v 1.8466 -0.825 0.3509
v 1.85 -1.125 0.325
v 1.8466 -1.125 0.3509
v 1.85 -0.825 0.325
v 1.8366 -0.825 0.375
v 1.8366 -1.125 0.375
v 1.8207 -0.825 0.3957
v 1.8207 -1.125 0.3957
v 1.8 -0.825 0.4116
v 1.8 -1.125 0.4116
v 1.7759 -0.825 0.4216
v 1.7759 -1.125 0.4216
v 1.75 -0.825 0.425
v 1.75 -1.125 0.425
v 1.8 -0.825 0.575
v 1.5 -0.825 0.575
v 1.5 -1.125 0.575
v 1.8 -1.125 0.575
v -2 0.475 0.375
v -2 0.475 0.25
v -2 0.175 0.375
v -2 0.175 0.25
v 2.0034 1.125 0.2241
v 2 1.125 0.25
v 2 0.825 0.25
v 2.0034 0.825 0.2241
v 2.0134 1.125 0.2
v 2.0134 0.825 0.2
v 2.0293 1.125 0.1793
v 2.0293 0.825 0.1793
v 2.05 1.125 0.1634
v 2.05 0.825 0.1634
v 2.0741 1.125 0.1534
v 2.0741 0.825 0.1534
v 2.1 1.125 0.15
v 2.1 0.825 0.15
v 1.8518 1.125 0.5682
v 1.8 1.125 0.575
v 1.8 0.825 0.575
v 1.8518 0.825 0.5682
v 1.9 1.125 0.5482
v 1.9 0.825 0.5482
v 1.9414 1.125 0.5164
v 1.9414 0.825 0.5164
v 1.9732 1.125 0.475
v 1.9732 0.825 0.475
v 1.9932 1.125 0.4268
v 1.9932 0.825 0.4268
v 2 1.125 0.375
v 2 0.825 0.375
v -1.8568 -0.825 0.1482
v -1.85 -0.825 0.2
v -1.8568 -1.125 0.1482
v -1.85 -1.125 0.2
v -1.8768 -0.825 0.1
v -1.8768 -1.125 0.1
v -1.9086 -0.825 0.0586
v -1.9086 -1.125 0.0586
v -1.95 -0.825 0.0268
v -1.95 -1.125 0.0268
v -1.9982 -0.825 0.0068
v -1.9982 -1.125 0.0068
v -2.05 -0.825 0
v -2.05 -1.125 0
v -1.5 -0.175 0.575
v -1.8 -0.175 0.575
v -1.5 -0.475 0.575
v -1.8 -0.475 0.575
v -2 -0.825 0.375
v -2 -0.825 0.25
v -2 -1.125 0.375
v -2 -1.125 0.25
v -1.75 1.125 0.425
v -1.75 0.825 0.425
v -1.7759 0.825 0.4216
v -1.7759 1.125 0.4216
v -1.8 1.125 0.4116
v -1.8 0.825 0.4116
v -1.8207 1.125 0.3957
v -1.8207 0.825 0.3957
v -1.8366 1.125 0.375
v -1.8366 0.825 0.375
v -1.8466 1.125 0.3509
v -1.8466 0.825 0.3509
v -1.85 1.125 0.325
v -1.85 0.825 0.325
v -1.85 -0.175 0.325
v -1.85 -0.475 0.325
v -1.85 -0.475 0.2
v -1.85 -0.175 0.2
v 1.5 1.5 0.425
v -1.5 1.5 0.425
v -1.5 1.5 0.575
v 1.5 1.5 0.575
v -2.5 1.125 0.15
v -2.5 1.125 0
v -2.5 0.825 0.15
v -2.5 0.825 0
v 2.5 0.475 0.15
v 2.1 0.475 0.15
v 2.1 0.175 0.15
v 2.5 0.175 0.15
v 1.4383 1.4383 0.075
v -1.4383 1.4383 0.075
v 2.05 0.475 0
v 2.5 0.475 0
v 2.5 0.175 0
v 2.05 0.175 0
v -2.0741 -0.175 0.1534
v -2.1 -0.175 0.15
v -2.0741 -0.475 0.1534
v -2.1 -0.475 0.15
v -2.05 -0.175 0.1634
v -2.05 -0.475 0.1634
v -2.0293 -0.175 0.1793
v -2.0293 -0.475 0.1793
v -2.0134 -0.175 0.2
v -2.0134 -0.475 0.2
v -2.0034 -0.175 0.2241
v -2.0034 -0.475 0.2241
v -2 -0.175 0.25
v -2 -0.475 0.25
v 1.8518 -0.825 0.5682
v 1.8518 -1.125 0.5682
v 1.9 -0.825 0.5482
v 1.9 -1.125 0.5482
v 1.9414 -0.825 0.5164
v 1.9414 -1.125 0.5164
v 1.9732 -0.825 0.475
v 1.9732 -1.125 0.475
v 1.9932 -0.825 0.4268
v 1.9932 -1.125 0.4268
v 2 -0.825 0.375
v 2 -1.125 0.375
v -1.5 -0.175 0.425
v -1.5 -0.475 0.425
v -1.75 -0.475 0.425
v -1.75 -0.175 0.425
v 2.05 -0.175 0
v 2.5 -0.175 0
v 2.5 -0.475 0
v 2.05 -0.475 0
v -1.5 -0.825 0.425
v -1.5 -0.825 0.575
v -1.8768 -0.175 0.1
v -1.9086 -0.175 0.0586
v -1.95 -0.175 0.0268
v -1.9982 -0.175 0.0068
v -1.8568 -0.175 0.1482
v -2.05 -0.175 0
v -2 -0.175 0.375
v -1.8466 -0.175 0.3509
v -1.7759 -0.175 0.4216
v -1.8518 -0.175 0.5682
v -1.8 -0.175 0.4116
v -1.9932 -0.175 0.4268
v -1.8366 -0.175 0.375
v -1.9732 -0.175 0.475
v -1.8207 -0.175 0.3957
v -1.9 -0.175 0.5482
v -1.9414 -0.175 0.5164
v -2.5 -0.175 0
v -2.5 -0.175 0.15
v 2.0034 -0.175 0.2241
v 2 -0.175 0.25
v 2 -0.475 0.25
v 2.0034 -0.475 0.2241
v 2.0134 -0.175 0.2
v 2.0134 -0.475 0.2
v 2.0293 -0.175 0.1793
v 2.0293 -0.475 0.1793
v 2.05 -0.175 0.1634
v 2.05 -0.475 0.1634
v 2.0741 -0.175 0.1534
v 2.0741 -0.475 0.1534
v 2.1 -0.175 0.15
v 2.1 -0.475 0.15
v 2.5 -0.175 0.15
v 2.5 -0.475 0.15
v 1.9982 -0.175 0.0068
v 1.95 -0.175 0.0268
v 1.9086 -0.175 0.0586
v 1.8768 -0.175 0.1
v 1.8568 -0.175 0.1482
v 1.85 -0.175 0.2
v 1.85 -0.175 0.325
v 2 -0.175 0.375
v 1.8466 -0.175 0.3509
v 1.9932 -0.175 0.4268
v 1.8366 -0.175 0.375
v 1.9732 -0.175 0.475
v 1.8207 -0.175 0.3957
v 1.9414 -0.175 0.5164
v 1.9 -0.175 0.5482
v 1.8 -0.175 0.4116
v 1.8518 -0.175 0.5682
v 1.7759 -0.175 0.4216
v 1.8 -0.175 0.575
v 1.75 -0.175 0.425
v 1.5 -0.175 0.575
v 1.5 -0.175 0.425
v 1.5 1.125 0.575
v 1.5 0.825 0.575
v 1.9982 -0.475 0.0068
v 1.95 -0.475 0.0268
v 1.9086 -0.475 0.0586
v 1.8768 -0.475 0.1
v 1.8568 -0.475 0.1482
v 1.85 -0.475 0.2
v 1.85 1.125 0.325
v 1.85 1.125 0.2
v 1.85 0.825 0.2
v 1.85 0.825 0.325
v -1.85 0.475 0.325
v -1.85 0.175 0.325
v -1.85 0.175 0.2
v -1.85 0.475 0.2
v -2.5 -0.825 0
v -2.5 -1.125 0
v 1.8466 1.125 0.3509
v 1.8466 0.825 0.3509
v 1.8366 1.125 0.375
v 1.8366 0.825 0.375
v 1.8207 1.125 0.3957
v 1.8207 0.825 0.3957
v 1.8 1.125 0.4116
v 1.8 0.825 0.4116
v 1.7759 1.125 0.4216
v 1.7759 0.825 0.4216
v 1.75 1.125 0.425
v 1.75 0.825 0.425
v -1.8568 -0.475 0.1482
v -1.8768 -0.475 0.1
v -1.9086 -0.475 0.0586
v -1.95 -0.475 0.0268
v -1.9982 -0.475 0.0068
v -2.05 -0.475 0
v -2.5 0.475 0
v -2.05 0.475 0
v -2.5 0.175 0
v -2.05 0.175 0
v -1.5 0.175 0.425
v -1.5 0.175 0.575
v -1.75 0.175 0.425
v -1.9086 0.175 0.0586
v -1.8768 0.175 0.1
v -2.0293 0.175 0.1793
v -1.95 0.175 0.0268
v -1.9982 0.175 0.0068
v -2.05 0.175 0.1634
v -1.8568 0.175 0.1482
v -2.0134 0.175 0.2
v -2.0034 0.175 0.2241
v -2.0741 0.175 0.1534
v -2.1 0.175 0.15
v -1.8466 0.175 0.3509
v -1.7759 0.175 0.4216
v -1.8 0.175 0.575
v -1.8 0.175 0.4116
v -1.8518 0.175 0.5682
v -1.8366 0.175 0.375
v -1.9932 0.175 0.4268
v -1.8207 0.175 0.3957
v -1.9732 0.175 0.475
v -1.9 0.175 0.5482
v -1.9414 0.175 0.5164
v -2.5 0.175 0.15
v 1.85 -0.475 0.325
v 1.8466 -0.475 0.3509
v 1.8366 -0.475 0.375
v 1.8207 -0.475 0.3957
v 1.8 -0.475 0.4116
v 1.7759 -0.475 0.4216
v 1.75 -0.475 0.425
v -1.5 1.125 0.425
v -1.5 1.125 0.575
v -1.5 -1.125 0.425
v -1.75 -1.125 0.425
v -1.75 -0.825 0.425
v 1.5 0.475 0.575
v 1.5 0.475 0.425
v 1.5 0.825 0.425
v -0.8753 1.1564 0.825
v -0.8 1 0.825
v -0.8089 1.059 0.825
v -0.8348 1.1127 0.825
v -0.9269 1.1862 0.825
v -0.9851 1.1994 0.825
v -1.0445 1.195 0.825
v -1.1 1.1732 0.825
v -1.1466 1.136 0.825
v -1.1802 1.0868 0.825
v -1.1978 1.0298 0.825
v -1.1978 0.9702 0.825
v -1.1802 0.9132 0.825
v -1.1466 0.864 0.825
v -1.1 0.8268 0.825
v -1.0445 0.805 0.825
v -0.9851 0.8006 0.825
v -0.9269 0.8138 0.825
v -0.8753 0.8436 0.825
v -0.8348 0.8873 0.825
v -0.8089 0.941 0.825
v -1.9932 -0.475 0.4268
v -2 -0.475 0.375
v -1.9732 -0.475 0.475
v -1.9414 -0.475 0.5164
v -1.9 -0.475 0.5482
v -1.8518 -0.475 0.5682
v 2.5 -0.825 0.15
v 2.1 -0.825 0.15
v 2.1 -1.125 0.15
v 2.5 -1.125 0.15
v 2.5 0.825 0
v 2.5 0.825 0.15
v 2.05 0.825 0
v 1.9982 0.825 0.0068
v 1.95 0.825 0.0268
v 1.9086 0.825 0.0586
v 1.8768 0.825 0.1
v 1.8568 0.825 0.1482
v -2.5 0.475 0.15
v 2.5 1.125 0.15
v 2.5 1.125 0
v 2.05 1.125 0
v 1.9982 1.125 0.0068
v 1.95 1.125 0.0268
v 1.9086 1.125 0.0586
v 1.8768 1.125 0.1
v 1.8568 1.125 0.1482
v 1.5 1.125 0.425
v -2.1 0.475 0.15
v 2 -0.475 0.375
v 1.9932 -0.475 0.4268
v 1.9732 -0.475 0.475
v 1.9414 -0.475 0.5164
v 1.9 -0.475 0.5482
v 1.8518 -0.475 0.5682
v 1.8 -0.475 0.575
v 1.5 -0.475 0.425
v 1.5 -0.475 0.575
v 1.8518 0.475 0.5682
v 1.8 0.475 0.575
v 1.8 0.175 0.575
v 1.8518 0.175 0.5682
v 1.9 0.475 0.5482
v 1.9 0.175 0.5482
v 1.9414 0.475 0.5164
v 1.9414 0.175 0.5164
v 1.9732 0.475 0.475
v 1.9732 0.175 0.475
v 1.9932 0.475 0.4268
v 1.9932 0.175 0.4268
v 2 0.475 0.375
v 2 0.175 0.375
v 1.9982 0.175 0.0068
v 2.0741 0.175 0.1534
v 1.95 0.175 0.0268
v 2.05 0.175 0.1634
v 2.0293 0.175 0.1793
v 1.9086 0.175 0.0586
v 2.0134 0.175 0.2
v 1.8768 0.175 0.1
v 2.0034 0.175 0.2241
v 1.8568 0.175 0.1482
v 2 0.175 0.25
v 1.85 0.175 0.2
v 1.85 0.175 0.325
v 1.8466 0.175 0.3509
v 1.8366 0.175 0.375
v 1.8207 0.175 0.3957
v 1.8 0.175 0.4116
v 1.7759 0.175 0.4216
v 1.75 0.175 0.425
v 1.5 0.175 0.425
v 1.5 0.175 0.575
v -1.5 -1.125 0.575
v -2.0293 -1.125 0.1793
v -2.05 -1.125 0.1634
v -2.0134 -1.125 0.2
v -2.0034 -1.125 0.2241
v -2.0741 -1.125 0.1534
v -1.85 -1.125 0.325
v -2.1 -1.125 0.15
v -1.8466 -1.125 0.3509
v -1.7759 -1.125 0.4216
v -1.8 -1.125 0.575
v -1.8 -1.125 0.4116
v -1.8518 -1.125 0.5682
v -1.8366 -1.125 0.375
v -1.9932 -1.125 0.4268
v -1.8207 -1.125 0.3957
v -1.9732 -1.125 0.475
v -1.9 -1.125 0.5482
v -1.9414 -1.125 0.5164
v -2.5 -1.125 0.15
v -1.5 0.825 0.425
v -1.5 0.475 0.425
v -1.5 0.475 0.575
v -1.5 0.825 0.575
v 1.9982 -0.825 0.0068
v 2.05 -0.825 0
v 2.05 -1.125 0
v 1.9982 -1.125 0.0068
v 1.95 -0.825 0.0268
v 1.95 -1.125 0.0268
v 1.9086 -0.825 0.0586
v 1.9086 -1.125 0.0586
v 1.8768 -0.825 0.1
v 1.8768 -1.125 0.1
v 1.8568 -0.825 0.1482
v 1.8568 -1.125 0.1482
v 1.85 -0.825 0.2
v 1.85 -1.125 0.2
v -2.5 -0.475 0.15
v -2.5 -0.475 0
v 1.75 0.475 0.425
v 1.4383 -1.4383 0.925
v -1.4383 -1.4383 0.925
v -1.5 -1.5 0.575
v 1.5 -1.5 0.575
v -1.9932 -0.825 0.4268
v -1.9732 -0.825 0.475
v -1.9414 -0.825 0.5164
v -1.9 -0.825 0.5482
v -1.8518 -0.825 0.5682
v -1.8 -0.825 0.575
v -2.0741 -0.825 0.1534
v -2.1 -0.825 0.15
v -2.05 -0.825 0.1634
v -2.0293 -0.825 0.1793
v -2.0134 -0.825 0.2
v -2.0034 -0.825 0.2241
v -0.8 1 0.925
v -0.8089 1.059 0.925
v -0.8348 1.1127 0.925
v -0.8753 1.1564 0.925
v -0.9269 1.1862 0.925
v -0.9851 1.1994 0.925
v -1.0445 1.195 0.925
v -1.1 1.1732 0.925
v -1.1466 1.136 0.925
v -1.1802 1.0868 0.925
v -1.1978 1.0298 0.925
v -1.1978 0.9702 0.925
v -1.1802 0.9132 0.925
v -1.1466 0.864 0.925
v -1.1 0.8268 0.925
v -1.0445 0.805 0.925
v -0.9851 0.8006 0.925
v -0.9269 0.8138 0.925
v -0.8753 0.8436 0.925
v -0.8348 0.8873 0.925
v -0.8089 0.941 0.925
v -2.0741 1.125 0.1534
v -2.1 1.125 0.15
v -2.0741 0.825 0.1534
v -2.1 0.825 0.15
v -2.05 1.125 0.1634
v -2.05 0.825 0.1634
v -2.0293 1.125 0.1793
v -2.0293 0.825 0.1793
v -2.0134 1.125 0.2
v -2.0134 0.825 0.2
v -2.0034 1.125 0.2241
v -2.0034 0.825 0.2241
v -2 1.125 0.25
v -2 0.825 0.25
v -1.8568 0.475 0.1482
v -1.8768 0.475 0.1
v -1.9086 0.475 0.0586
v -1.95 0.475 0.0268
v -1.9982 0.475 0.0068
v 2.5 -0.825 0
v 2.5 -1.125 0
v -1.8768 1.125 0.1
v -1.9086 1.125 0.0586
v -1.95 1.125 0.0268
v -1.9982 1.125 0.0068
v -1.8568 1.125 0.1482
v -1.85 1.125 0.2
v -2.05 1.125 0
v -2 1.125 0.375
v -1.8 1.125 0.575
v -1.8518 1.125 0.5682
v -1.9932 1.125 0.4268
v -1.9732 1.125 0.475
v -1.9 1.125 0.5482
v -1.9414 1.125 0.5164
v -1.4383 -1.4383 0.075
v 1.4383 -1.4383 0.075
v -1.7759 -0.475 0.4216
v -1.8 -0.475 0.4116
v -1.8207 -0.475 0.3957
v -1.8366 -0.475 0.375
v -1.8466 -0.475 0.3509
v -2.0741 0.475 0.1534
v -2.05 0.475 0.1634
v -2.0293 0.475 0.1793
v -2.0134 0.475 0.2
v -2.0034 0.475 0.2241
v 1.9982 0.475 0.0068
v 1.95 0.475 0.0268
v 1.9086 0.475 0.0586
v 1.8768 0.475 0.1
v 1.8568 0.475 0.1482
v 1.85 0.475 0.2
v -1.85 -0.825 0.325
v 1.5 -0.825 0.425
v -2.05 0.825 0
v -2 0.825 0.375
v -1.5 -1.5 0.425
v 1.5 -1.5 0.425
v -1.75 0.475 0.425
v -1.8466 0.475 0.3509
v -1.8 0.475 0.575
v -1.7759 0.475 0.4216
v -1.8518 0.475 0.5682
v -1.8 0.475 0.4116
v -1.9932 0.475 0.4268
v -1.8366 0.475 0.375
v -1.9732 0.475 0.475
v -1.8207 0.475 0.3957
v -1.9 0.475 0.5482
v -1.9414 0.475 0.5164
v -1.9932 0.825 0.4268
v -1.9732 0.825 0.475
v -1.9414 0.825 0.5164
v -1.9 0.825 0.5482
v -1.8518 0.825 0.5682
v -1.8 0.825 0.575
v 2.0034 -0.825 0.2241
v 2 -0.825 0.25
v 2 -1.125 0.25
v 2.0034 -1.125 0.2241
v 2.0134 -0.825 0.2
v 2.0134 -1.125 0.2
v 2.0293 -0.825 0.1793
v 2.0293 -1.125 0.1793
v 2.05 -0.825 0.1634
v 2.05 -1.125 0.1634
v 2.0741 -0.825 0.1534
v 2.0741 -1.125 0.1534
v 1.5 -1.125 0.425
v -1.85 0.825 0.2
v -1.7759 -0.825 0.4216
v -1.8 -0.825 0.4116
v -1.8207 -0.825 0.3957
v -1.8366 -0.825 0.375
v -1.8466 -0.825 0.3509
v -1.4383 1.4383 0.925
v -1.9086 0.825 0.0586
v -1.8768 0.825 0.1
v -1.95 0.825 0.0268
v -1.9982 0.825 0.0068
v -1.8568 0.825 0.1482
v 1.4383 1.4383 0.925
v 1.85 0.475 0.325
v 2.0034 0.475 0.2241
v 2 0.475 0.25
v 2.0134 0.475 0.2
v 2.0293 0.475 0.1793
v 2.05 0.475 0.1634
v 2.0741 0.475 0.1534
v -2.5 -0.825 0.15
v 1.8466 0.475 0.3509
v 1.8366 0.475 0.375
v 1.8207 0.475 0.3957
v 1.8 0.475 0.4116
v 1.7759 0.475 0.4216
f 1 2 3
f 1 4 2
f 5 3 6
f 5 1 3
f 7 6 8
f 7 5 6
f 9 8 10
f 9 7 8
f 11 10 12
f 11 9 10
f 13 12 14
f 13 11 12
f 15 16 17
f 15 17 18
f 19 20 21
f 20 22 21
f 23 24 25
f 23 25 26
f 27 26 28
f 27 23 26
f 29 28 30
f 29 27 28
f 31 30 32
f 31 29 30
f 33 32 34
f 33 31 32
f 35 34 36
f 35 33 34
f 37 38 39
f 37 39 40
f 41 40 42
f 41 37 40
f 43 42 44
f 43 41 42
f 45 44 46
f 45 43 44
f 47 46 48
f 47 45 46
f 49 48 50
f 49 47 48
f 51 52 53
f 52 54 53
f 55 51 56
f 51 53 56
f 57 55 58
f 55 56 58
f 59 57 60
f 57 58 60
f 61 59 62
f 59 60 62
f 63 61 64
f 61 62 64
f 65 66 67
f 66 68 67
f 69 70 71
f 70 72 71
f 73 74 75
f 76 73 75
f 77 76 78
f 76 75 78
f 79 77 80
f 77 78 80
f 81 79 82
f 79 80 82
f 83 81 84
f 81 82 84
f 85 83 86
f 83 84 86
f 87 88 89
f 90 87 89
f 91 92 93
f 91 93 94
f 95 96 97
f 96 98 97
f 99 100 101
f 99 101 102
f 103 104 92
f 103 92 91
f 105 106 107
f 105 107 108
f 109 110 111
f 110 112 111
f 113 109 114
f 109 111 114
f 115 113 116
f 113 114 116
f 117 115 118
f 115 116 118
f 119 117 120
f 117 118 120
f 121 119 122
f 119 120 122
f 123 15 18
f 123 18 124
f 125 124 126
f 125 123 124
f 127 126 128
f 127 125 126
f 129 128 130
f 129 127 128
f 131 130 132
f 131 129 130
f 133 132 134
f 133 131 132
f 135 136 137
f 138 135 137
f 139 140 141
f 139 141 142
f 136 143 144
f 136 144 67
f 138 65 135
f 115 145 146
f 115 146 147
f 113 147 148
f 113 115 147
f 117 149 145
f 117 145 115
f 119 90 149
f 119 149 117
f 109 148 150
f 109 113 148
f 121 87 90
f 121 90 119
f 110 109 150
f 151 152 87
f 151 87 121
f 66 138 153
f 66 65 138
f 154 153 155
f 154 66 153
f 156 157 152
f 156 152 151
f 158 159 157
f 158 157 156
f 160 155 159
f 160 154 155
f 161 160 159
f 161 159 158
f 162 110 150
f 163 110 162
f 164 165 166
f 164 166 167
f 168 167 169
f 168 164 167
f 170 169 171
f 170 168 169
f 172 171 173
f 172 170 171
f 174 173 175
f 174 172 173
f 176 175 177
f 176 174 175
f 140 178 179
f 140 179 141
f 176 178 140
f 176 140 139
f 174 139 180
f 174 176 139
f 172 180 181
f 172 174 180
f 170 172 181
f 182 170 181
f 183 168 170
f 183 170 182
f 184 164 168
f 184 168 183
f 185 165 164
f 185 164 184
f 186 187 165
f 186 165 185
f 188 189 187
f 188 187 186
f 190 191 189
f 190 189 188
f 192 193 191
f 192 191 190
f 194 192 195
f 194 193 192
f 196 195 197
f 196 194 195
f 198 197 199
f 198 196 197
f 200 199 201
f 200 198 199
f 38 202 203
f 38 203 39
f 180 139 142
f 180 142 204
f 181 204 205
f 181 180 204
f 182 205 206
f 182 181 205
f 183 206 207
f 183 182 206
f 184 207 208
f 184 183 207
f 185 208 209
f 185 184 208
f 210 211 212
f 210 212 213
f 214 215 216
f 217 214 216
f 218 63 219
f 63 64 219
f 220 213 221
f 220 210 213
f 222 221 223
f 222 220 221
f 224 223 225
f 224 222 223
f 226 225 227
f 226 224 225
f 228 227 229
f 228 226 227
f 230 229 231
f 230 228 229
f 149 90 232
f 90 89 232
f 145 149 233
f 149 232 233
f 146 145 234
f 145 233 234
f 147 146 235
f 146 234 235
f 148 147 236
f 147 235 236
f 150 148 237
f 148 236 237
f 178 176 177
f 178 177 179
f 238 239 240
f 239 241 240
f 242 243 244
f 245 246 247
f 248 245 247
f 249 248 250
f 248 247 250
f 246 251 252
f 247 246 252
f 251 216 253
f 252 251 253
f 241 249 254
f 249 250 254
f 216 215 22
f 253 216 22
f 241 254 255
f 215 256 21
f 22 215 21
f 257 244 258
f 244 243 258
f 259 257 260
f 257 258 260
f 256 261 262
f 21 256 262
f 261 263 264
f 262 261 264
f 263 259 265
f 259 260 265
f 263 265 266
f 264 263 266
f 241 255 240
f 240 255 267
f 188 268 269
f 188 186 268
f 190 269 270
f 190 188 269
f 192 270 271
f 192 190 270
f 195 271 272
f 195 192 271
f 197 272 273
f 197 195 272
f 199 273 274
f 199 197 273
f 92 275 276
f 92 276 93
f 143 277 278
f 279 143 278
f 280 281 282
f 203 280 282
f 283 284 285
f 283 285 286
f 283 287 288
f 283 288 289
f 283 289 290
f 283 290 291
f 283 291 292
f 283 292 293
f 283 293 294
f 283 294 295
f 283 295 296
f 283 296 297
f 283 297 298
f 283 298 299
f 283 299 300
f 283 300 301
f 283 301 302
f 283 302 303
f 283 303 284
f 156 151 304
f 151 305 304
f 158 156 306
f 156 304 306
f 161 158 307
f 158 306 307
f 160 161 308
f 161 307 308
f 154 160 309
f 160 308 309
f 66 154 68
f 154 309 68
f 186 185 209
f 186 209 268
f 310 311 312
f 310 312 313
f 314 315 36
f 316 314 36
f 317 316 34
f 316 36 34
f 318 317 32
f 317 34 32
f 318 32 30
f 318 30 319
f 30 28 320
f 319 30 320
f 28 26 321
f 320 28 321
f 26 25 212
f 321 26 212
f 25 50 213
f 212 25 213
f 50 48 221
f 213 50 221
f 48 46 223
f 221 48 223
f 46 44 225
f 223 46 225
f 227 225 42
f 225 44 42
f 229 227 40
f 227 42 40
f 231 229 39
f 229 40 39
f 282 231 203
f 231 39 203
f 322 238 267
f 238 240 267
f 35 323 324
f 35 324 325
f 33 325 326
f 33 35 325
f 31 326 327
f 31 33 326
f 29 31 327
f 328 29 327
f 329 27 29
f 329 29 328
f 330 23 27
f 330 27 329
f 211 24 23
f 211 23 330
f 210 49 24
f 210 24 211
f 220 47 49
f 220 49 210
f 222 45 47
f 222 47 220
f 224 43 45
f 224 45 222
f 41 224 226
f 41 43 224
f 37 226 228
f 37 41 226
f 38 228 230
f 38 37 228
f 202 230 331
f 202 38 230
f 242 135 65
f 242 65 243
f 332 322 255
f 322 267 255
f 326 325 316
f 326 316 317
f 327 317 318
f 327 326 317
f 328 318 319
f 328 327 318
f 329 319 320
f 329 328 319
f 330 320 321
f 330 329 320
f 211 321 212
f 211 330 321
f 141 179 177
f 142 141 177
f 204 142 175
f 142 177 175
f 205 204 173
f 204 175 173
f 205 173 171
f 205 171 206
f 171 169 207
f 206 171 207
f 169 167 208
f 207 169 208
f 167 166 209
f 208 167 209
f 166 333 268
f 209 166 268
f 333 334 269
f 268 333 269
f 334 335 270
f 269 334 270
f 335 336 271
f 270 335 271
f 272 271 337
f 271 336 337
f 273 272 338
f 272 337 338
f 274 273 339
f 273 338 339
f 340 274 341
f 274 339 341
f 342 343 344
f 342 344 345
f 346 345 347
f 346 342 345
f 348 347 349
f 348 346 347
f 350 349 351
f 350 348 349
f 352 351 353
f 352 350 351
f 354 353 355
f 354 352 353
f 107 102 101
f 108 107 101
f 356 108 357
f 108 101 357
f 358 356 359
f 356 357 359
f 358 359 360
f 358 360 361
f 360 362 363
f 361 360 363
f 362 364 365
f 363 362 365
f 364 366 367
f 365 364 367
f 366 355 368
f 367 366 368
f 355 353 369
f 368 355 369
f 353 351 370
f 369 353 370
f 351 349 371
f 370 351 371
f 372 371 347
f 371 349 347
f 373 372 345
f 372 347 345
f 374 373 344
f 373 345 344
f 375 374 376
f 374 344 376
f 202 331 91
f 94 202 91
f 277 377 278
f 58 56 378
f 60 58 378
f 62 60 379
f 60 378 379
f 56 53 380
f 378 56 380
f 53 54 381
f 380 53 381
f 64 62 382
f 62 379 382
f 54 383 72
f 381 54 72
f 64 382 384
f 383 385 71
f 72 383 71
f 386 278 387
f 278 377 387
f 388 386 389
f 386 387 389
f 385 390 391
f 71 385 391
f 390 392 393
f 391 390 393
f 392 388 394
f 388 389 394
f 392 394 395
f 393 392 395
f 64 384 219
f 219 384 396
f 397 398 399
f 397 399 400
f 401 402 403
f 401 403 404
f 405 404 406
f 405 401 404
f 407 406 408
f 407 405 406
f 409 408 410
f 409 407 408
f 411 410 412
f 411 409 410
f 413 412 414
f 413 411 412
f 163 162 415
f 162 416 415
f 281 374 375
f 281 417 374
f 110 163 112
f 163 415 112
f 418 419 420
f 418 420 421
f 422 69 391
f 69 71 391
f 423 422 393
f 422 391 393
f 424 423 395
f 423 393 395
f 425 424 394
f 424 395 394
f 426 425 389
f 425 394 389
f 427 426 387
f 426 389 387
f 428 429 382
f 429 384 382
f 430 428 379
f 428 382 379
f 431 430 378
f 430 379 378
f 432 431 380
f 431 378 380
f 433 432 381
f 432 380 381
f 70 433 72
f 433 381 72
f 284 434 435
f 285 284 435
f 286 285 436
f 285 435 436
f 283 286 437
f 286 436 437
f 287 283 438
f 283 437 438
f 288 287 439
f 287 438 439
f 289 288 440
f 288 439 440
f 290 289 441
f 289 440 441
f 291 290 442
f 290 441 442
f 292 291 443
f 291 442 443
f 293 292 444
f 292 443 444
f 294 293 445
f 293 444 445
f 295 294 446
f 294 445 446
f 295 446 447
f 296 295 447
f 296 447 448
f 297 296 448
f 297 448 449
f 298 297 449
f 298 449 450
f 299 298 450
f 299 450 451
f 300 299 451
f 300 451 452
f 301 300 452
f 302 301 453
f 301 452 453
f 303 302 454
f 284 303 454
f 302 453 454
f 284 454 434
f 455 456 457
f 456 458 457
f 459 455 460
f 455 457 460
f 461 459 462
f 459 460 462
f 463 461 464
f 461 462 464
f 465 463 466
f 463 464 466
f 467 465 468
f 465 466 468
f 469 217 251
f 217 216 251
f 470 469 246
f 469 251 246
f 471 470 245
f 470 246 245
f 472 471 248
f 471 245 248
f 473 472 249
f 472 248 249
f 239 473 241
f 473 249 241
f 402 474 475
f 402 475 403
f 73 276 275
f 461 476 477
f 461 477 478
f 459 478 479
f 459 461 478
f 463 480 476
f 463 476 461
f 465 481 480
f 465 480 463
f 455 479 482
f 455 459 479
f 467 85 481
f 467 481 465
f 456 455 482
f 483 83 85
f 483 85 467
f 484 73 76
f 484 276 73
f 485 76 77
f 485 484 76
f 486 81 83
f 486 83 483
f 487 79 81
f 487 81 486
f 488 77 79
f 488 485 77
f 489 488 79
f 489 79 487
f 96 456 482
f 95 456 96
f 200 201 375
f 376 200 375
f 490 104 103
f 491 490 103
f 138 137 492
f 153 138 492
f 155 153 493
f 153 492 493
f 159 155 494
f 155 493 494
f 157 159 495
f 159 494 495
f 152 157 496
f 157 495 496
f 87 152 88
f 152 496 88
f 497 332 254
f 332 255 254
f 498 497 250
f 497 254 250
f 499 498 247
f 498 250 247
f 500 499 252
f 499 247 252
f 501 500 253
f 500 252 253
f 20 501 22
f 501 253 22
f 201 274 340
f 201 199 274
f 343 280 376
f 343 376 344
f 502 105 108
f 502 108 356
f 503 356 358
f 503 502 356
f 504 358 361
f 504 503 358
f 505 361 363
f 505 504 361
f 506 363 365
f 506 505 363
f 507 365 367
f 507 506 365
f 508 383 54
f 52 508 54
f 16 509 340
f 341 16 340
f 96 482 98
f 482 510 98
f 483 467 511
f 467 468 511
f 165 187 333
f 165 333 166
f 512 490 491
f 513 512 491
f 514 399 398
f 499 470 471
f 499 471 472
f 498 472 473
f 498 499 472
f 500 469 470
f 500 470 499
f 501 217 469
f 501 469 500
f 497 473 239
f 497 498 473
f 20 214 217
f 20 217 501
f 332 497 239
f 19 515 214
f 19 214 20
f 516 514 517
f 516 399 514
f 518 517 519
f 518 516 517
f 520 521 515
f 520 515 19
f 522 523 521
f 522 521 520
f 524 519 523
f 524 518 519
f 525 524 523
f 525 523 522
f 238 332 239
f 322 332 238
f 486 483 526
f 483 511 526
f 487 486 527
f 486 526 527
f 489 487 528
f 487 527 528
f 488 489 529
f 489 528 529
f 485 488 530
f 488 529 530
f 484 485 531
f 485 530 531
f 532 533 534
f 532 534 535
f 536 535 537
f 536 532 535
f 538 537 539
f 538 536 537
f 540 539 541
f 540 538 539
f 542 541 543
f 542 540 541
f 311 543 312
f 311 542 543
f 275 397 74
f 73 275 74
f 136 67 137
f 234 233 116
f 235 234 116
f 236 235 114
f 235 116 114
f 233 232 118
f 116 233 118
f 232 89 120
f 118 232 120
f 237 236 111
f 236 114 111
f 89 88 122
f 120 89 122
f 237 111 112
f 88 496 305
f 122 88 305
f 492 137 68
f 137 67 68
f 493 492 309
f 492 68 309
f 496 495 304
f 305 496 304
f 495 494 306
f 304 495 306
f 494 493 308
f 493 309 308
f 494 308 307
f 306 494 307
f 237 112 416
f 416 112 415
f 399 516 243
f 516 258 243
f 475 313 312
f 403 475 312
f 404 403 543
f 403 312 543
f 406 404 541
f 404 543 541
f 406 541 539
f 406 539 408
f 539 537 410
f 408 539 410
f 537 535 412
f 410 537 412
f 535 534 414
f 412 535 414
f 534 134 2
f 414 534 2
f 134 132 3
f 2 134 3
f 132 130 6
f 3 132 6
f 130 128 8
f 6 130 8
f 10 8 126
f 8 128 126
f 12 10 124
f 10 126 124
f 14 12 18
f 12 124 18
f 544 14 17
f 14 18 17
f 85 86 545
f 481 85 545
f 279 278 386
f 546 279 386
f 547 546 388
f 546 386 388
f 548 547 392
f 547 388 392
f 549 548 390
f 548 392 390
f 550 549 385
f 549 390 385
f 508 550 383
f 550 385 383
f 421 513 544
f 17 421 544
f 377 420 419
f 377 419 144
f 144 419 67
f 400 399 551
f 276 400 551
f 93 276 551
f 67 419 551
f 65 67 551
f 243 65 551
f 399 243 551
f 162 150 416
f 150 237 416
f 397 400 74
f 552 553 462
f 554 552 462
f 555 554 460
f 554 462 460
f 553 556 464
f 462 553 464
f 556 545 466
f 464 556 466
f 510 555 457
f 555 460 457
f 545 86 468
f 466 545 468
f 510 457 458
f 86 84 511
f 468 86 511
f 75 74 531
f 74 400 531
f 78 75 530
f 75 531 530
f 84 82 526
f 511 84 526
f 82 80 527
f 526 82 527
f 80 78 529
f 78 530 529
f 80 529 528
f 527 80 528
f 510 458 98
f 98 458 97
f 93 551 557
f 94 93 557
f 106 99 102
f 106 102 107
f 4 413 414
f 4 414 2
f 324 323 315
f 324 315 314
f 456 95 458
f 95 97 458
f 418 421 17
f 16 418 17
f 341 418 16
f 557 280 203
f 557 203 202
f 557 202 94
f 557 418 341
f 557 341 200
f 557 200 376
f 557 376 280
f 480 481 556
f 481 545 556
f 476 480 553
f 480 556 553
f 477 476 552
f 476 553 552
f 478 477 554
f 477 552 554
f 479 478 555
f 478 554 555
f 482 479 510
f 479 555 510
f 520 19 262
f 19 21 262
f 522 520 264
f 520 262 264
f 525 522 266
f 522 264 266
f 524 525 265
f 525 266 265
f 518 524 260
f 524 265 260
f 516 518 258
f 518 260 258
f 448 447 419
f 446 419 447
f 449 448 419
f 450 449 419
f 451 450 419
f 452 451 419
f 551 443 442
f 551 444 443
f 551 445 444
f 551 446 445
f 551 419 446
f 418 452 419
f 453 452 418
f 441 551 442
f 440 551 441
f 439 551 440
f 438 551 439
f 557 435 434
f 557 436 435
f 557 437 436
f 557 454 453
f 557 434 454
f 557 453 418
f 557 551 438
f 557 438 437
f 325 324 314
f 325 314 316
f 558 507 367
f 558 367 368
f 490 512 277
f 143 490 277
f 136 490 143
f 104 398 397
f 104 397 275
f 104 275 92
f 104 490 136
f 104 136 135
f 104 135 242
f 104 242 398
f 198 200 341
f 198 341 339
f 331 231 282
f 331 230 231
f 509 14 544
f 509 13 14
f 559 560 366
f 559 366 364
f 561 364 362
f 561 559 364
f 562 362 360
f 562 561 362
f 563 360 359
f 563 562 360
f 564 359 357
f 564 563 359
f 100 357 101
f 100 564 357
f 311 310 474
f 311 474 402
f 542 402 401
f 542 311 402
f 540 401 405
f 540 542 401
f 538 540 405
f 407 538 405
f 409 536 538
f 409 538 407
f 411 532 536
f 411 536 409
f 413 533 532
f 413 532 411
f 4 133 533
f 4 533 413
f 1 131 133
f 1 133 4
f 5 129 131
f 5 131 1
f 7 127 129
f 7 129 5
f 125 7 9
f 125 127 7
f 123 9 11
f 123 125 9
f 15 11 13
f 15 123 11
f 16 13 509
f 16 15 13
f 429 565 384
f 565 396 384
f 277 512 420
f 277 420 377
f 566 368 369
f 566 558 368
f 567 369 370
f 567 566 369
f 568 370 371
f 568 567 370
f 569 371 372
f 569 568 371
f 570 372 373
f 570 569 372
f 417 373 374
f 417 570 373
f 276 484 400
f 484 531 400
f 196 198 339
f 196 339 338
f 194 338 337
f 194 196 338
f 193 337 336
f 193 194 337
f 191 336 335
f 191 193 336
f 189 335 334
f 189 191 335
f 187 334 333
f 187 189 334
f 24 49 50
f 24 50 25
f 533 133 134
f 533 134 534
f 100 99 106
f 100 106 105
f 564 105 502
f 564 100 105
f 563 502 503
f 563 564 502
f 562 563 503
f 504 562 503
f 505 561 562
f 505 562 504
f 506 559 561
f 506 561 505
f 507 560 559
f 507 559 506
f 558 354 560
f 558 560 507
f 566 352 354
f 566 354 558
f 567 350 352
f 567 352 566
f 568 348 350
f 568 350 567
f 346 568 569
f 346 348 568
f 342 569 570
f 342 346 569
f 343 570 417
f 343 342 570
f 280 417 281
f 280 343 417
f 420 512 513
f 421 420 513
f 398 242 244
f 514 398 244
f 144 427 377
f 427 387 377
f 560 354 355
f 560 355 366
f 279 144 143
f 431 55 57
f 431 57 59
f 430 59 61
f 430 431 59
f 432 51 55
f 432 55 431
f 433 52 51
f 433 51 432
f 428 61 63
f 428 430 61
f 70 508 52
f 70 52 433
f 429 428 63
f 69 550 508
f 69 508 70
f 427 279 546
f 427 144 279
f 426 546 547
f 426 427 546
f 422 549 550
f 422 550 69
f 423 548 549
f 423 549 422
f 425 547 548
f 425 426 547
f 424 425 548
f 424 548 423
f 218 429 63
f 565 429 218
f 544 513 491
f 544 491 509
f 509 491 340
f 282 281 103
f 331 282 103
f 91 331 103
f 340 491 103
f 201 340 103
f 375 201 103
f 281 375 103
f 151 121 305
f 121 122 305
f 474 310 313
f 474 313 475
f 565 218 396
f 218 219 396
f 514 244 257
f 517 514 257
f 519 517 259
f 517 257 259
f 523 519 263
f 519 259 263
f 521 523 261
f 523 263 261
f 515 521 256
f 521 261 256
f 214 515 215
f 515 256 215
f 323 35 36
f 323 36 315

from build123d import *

# Parameters (mm, degrees)
SKETCH_1_W             = 3
SKETCH_1_H             = 3
EXTRUDE_1_DEPTH        = 0.85
CHAMFER_1_SIZE         = 0.35
CHAMFER_1_SIZE2        = 0.061714443
CHAMFER_1_PART_2_SIZE  = 0.35
CHAMFER_1_PART_2_SIZE2 = 0.061714443
CHAMFER_1_PART_3_SIZE  = 0.35
CHAMFER_1_PART_3_SIZE2 = 0.061714443
CHAMFER_1_PART_4_SIZE  = 0.35
CHAMFER_1_PART_4_SIZE2 = 0.061714443
EXTRUDE_2_DEPTH        = 0.15
PATTERN_LINEAR_1_COUNT = 4
PATTERN_LINEAR_1_PITCH = 0.65
SKETCH_4_R             = 0.2
CUT_EXTRUDE_1_DEPTH    = 0.1


with BuildPart() as part:
    # Эскиз1 → Бобышка-Вытянуть1 (new body)
    with BuildSketch(Plane.XY.offset(0.075)):
        Rectangle(SKETCH_1_W, SKETCH_1_H)
    extrude(amount=EXTRUDE_1_DEPTH)

    # Фаска1
    chamfer_1_edges = [part.edges().sort_by_distance(p)[0] for p in [
        (1.5, 0, 0.925),
        (1.5, 0, 0.075),
    ]]
    chamfer_1_side = [part.faces().sort_by_distance(p)[0] for p in [
        (1.5, 0, 0.5),
    ]]
    chamfer(chamfer_1_edges, length=CHAMFER_1_SIZE, length2=CHAMFER_1_SIZE2, reference=chamfer_1_side[0])

    # Фаска1 part 2
    chamfer_1_part_2_edges = [part.edges().sort_by_distance(p)[0] for p in [
        (0, 1.5, 0.925),
        (0, 1.5, 0.075),
    ]]
    chamfer_1_part_2_side = [part.faces().sort_by_distance(p)[0] for p in [
        (0, 1.5, 0.5),
    ]]
    chamfer(chamfer_1_part_2_edges, length=CHAMFER_1_PART_2_SIZE, length2=CHAMFER_1_PART_2_SIZE2, reference=chamfer_1_part_2_side[0])

    # Фаска1 part 3
    chamfer_1_part_3_edges = [part.edges().sort_by_distance(p)[0] for p in [
        (-1.5, 0, 0.925),
        (-1.5, 0, 0.075),
    ]]
    chamfer_1_part_3_side = [part.faces().sort_by_distance(p)[0] for p in [
        (-1.5, 0, 0.5),
    ]]
    chamfer(chamfer_1_part_3_edges, length=CHAMFER_1_PART_3_SIZE, length2=CHAMFER_1_PART_3_SIZE2, reference=chamfer_1_part_3_side[0])

    # Фаска1 part 4
    chamfer_1_part_4_edges = [part.edges().sort_by_distance(p)[0] for p in [
        (0, -1.5, 0.075),
        (0, -1.5, 0.925),
    ]]
    chamfer_1_part_4_side = [part.faces().sort_by_distance(p)[0] for p in [
        (0, -1.5, 0.5),
    ]]
    chamfer(chamfer_1_part_4_edges, length=CHAMFER_1_PART_4_SIZE, length2=CHAMFER_1_PART_4_SIZE2, reference=chamfer_1_part_4_side[0])

    # Эскиз3 → Бобышка-Вытянуть2 (add, symmetric)
    with BuildSketch(Plane(origin=(0, 0.975, 0), x_dir=(-1, 0, 0), z_dir=(0, 1, 0))):
        with BuildLine():
            Line((1.85, 0.325), (1.85, 0.2))
            ThreePointArc((1.85, 0.2), (1.908578644, 0.058578644), (2.05, 0))
            Line((2.05, 0), (2.5, 0))
            Line((2.5, 0), (2.5, 0.15))
            Line((2.5, 0.15), (2.1, 0.15))
            ThreePointArc((2.1, 0.15), (2.029289322, 0.179289322), (2, 0.25))
            Line((2, 0.25), (2, 0.375))
            ThreePointArc((2, 0.375), (1.941421356, 0.516421356), (1.8, 0.575))
            Line((1.8, 0.575), (1.5, 0.575))
            Line((1.5, 0.575), (1.5, 0.425))
            Line((1.5, 0.425), (1.75, 0.425))
            ThreePointArc((1.75, 0.425), (1.820710678, 0.395710678), (1.85, 0.325))
        make_face()
        with BuildLine():
            Line((-1.5, 0.425), (-1.5, 0.575))
            Line((-1.5, 0.575), (-1.8, 0.575))
            ThreePointArc((-1.8, 0.575), (-1.941421356, 0.516421356), (-2, 0.375))
            Line((-2, 0.375), (-2, 0.25))
            ThreePointArc((-2, 0.25), (-2.029289322, 0.179289322), (-2.1, 0.15))
            Line((-2.1, 0.15), (-2.5, 0.15))
            Line((-2.5, 0.15), (-2.5, 0))
            Line((-2.5, 0), (-2.05, 0))
            ThreePointArc((-2.05, 0), (-1.908578644, 0.058578644), (-1.85, 0.2))
            Line((-1.85, 0.2), (-1.85, 0.325))
            ThreePointArc((-1.85, 0.325), (-1.820710678, 0.395710678), (-1.75, 0.425))
            Line((-1.75, 0.425), (-1.5, 0.425))
        make_face()
    extrude_2 = extrude(amount=EXTRUDE_2_DEPTH, both=True)

    # Линейный массив1: Бобышка-Вытянуть2 ×4
    with Locations(*[(0, -i * PATTERN_LINEAR_1_PITCH, 0) for i in range(1, PATTERN_LINEAR_1_COUNT)]):
        add(extrude_2)

    # Эскиз4 → Вырез-Вытянуть1 (cut)
    with BuildSketch(Plane.XY.offset(0.925)):
        with Locations((-1, 1)):
            Circle(SKETCH_4_R)
    extrude(amount=-CUT_EXTRUDE_1_DEPTH, mode=Mode.SUBTRACT)


solid = part.part
